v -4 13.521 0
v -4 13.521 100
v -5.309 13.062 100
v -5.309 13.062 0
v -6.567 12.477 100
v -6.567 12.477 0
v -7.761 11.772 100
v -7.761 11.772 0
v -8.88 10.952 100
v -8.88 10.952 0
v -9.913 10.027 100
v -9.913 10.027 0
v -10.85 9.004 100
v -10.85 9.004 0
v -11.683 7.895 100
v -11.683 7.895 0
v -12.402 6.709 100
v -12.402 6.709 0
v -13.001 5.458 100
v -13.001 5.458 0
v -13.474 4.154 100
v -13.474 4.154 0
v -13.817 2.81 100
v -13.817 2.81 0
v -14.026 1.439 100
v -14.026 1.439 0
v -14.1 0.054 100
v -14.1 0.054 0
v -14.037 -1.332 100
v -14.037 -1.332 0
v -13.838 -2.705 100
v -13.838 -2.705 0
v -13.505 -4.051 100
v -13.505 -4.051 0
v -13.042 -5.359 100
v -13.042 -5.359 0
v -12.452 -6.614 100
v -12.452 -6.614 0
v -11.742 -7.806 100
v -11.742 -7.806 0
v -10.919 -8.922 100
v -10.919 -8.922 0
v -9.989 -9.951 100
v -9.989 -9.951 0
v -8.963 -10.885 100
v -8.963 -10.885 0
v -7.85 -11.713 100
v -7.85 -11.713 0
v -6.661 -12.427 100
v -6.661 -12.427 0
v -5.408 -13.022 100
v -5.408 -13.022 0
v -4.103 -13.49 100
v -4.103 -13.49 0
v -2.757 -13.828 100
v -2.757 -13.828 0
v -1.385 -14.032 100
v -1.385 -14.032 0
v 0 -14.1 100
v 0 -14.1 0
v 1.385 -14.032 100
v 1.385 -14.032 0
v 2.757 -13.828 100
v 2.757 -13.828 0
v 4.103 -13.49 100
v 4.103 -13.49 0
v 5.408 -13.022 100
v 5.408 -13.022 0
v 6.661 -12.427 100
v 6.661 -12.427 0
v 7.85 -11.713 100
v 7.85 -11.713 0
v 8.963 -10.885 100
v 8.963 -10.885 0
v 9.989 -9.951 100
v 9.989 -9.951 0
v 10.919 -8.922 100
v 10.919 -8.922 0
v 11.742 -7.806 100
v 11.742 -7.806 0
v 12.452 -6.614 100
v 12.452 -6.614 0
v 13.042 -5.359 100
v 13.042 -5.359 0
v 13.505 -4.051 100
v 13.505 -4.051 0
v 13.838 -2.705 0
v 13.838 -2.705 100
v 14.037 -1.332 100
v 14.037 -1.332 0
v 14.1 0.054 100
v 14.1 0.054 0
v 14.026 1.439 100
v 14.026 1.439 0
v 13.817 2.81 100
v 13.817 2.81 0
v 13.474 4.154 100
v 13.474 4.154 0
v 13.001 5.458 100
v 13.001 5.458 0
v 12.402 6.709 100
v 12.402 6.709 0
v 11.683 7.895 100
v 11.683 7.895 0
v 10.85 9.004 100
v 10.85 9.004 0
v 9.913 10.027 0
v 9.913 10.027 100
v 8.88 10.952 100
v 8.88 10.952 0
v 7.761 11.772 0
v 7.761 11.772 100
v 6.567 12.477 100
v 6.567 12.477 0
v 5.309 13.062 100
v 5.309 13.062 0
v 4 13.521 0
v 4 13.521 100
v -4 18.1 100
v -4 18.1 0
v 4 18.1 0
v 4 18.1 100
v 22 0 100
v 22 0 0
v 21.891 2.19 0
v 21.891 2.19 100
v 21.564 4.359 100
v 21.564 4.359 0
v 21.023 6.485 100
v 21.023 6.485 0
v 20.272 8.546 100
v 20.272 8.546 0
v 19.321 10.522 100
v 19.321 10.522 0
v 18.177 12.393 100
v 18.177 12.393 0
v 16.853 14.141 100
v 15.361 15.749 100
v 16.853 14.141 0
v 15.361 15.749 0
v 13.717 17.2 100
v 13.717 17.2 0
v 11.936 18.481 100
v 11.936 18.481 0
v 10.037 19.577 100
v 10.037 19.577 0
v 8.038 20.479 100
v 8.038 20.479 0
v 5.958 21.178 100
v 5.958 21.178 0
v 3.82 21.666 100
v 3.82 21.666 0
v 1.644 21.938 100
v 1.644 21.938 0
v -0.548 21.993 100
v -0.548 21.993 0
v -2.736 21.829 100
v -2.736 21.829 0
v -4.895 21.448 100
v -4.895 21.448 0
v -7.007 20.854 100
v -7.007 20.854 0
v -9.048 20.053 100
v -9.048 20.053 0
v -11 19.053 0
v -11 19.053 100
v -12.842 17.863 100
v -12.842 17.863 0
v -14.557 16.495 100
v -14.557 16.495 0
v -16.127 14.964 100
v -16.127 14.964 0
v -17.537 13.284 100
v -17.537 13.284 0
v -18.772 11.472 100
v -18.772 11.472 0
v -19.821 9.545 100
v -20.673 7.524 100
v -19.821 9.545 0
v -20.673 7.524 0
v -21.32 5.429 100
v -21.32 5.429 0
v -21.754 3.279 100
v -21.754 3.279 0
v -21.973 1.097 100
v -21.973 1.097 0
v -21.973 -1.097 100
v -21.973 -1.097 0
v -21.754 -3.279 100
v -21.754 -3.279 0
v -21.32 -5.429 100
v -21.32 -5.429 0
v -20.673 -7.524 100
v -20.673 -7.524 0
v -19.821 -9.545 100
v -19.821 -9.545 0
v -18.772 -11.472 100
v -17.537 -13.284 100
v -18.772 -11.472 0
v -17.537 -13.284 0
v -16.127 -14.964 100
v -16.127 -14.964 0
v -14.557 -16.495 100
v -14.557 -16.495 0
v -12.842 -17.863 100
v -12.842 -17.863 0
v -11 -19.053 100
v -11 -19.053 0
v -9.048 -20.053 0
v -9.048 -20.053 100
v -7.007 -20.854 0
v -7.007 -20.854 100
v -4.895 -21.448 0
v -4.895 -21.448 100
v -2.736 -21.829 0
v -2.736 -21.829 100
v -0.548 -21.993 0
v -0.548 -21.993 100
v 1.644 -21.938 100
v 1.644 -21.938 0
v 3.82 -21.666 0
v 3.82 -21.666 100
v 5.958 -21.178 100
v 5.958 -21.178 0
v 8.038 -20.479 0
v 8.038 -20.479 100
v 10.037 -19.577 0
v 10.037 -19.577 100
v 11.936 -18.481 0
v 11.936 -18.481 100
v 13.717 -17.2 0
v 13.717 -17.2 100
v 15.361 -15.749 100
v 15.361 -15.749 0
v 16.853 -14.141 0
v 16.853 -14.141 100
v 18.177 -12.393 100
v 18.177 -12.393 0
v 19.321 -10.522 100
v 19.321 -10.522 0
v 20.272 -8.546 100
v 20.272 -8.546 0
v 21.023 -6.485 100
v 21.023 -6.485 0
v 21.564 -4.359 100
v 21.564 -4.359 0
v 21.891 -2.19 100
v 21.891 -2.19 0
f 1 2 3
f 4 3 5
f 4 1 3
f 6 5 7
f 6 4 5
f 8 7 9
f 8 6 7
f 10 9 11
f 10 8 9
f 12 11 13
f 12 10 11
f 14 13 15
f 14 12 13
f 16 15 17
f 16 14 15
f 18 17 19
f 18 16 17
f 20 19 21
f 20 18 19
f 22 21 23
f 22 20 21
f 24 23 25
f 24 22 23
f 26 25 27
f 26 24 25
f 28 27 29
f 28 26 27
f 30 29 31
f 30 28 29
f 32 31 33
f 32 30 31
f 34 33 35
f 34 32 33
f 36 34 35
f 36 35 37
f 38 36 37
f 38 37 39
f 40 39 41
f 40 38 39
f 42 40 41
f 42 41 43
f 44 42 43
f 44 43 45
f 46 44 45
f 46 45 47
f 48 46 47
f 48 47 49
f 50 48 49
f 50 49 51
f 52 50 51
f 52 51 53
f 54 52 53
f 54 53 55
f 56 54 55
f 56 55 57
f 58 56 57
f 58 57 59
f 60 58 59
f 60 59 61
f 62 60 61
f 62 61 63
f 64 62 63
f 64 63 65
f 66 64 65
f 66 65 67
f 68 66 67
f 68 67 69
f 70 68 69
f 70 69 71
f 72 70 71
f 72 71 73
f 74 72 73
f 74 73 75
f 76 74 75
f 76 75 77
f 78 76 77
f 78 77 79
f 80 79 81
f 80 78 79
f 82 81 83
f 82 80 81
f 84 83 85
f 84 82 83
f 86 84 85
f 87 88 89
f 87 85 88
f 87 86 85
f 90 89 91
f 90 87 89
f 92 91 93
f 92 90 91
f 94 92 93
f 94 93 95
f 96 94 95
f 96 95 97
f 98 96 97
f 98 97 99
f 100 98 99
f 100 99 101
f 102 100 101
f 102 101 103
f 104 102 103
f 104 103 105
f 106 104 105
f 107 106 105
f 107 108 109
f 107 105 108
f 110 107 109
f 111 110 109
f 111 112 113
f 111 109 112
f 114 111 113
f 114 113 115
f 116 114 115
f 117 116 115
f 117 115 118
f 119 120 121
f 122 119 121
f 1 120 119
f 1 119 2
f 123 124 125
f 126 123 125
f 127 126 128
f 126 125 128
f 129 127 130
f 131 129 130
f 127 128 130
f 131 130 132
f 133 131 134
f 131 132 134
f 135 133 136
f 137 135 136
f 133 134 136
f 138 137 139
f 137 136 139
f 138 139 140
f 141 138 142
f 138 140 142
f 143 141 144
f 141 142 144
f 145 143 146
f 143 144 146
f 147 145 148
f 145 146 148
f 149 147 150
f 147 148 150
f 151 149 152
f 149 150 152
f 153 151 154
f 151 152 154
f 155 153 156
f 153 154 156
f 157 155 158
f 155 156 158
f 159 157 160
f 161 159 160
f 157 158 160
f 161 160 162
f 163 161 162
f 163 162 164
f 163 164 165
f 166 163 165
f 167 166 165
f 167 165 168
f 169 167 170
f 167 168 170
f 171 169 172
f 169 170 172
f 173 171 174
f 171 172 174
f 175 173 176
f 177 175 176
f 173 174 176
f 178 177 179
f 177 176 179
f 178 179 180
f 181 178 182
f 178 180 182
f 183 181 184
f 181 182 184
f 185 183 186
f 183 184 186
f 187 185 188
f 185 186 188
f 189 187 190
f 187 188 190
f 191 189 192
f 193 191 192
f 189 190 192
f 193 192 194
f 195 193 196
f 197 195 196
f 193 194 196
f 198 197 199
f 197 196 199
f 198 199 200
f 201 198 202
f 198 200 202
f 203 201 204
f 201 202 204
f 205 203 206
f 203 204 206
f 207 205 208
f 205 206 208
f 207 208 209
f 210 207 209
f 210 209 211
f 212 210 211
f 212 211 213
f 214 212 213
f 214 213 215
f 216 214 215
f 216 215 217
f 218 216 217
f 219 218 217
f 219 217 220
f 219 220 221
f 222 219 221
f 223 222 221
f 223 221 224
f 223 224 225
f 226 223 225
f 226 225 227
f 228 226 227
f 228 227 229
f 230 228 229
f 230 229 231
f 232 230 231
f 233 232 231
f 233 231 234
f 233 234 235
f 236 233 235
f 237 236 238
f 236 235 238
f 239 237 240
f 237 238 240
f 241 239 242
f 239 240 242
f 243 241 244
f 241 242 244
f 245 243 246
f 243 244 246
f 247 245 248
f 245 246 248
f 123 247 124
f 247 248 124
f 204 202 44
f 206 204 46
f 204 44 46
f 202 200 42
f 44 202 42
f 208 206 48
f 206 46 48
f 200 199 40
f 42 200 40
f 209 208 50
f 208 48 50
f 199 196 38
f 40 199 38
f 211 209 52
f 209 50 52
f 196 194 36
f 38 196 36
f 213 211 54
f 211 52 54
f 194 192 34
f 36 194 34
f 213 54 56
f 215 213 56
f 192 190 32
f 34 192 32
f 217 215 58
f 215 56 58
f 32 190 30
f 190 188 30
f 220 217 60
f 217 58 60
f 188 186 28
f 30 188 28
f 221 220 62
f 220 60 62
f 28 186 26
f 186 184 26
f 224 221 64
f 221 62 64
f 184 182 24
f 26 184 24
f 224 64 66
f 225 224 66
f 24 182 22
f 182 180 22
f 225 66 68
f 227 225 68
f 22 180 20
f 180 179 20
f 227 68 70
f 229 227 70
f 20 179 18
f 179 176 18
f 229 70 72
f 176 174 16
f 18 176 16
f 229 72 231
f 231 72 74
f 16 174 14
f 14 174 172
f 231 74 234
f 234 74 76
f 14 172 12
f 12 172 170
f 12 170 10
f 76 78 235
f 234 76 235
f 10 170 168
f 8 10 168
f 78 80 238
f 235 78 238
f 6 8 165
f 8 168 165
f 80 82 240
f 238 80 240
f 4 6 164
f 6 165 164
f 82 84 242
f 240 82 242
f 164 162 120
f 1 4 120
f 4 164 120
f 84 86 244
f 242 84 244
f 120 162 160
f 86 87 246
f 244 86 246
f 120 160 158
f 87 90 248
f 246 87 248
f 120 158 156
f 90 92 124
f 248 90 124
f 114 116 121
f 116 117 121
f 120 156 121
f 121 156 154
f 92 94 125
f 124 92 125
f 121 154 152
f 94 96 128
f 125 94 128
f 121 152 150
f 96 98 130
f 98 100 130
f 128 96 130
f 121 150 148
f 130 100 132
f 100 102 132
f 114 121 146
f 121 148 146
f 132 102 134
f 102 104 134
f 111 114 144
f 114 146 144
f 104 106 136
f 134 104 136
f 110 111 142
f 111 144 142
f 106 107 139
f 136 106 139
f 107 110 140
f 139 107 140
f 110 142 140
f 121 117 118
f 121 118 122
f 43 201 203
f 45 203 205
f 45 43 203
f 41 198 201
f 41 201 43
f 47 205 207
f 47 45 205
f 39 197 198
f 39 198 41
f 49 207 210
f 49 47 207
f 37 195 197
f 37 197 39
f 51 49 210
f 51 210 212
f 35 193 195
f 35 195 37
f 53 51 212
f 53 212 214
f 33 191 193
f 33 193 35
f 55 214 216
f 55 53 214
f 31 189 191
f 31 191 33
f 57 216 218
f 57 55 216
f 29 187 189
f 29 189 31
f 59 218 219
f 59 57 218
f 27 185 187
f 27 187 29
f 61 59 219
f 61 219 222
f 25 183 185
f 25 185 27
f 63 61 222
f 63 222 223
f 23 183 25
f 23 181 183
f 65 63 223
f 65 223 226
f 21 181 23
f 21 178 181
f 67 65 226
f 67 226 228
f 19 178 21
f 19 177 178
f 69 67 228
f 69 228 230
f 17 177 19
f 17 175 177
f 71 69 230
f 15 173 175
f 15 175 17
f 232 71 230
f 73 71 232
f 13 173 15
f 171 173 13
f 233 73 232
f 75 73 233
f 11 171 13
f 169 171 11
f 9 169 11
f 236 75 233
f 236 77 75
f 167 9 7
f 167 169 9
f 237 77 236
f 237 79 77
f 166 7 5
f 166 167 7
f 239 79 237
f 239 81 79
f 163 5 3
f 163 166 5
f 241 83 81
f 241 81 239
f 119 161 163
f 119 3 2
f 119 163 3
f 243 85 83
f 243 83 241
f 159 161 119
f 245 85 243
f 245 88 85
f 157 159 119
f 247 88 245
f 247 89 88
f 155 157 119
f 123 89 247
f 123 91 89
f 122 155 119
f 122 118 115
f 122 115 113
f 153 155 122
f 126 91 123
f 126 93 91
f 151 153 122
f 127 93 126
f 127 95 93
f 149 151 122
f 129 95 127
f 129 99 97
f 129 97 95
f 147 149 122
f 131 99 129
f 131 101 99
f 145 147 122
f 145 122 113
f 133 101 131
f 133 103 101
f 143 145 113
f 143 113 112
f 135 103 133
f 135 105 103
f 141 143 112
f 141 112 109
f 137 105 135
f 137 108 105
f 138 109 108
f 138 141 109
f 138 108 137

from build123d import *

# Parameters (mm, degrees)
SKETCH1_R           = 22
SKETCH1_R_2         = 14.1
BOSS_EXTRUDE1_DEPTH = 100
CUT_EXTRUDE1_DEPTH  = 105.728219693


with BuildPart() as part:
    # Sketch1 → Boss-Extrude1 (new body)
    with BuildSketch(Plane.XY):
        Circle(SKETCH1_R)
        Circle(SKETCH1_R_2, mode=Mode.SUBTRACT)
    extrude(amount=BOSS_EXTRUDE1_DEPTH)

    # Sketch2 → Cut-Extrude1 (cut, through all)
    with BuildSketch(Plane(origin=(0, 0, 0), x_dir=(-1, 0, 0), z_dir=(0, 0, -1))):
        Polygon((0, 18.1), (4, 18.1), (4, 12.1), (-4, 12.1), (-4, 18.1), align=None)
    extrude(amount=-CUT_EXTRUDE1_DEPTH, mode=Mode.SUBTRACT)


solid = part.part
